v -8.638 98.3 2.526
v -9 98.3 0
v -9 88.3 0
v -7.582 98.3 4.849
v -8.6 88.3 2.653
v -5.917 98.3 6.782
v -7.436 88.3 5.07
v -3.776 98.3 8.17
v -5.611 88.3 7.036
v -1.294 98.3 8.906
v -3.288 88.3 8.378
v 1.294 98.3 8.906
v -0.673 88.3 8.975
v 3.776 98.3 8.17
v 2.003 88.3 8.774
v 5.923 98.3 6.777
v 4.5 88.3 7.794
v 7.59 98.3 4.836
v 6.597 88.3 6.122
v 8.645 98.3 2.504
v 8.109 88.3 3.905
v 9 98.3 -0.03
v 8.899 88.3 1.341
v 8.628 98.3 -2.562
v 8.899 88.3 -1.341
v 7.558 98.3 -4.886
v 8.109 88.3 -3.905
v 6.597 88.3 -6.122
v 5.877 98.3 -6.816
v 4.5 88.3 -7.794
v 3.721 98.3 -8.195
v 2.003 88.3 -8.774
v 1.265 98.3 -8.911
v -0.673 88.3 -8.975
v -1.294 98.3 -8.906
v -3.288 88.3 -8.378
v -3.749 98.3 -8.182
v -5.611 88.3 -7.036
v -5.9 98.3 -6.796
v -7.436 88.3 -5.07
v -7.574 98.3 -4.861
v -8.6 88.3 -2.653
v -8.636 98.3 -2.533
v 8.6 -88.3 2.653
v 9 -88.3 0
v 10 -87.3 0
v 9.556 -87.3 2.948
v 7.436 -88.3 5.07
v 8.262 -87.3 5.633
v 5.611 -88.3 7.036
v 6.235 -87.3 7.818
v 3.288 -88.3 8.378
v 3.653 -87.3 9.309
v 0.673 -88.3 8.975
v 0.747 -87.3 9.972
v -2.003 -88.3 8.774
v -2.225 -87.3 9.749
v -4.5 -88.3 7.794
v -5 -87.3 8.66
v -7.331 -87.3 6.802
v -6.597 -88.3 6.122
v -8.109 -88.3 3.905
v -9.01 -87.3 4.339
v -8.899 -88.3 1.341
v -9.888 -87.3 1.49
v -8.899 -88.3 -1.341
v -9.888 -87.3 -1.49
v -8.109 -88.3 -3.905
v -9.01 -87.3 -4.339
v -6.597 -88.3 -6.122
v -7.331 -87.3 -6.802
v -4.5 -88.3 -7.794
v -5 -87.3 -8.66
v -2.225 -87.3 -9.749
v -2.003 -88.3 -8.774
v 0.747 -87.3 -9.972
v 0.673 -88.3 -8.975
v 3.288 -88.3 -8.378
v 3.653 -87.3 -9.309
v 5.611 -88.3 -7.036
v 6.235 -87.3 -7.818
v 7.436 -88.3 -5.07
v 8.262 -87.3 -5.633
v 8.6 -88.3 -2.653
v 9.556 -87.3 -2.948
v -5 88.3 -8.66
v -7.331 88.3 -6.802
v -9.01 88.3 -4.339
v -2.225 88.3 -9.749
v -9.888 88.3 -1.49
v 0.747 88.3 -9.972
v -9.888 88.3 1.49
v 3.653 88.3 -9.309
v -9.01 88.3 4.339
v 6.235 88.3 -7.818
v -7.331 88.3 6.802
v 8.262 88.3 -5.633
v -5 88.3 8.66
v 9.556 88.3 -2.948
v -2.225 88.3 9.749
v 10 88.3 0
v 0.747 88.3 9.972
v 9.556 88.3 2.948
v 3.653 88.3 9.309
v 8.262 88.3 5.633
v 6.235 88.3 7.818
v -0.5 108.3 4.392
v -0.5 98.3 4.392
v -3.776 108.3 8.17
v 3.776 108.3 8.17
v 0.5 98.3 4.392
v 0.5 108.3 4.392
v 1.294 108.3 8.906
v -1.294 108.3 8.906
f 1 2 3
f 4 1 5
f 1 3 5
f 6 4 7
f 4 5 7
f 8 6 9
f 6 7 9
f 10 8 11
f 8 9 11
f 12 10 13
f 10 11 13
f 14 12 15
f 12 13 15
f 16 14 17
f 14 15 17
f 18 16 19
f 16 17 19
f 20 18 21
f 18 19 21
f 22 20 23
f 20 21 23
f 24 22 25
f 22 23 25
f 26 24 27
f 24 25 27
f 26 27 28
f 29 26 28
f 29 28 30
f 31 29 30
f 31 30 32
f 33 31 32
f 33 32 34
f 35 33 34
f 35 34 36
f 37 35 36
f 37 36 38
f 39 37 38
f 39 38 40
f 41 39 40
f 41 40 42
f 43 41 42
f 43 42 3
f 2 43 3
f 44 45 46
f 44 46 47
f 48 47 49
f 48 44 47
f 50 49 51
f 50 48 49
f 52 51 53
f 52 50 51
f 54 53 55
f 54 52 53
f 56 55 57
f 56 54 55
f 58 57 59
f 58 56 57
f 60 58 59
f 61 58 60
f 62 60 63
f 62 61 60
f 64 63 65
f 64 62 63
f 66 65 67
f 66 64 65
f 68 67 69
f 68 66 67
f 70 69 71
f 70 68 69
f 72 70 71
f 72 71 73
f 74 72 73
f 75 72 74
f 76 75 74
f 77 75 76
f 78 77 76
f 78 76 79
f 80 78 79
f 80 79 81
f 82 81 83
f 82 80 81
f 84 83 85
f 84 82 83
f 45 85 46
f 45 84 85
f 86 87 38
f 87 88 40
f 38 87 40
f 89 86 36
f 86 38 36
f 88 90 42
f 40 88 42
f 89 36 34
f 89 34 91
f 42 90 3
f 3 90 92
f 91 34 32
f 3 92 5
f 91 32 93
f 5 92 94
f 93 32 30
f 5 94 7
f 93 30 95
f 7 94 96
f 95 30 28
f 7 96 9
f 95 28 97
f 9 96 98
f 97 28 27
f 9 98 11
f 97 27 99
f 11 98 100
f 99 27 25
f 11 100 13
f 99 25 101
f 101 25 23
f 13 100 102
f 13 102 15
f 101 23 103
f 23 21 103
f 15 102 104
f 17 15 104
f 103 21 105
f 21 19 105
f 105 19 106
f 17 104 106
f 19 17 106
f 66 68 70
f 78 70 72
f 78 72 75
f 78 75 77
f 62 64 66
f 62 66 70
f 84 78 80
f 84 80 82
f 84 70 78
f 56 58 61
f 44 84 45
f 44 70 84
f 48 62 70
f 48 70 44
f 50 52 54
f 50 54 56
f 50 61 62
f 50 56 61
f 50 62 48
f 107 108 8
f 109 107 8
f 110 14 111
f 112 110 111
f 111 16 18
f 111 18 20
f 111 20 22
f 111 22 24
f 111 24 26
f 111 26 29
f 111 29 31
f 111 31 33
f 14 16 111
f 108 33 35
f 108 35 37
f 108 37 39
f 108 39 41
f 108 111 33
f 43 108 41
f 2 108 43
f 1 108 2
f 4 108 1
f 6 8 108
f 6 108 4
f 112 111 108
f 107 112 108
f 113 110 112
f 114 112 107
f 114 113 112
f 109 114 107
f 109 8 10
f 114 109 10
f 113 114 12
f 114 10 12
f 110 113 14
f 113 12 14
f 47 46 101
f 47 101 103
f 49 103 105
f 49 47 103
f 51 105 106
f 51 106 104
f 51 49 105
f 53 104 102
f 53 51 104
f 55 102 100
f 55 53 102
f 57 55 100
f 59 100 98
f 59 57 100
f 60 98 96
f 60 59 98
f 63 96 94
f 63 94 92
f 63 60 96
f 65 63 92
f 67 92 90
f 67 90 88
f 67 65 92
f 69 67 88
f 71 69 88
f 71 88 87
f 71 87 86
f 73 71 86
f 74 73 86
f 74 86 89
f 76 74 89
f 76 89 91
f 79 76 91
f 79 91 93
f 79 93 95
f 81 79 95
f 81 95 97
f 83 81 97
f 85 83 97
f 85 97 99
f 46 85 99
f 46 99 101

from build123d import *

# Parameters (mm, degrees)
F0_R     = 10
F1_DEPTH = 88.3
F2_R     = 9
F3_DEPTH = 10
F5_DEPTH = 10
F6_SIZE  = 1


with BuildPart() as f1:
    # F0 (on Front) → F1 (new body, symmetric)
    with BuildSketch(Plane.XZ):
        Circle(F0_R)
    extrude(amount=F1_DEPTH, both=True)

    # F2 (on face) → F3 (join)
    with BuildSketch(Plane(origin=(0, 88.3, 0), x_dir=(-1, 0, 0), z_dir=(0, 1, 0))):
        Circle(F2_R)
    extrude(amount=F3_DEPTH)

    # F4 (on face) → F5 (join)
    with BuildSketch(Plane(origin=(0, 98.3, 0), x_dir=(-1, 0, 0), z_dir=(0, 1, 0))):
        with BuildLine():
            ThreePointArc((3.775918, 8.169605), (0, 9), (-3.775918, 8.169605))
            Line((-3.775918, 8.169605), (-0.5, 4.392257))
            Line((-0.5, 4.392257), (0.5, 4.392257))
            Line((0.5, 4.392257), (3.775918, 8.169605))
        make_face()
    extrude(amount=F5_DEPTH)

    # F6
    f6_edges = [f1.edges().sort_by_distance(p)[0] for p in [
        (-10, -88.3, 0),
    ]]
    chamfer(f6_edges, length=F6_SIZE)


solid = f1.part
